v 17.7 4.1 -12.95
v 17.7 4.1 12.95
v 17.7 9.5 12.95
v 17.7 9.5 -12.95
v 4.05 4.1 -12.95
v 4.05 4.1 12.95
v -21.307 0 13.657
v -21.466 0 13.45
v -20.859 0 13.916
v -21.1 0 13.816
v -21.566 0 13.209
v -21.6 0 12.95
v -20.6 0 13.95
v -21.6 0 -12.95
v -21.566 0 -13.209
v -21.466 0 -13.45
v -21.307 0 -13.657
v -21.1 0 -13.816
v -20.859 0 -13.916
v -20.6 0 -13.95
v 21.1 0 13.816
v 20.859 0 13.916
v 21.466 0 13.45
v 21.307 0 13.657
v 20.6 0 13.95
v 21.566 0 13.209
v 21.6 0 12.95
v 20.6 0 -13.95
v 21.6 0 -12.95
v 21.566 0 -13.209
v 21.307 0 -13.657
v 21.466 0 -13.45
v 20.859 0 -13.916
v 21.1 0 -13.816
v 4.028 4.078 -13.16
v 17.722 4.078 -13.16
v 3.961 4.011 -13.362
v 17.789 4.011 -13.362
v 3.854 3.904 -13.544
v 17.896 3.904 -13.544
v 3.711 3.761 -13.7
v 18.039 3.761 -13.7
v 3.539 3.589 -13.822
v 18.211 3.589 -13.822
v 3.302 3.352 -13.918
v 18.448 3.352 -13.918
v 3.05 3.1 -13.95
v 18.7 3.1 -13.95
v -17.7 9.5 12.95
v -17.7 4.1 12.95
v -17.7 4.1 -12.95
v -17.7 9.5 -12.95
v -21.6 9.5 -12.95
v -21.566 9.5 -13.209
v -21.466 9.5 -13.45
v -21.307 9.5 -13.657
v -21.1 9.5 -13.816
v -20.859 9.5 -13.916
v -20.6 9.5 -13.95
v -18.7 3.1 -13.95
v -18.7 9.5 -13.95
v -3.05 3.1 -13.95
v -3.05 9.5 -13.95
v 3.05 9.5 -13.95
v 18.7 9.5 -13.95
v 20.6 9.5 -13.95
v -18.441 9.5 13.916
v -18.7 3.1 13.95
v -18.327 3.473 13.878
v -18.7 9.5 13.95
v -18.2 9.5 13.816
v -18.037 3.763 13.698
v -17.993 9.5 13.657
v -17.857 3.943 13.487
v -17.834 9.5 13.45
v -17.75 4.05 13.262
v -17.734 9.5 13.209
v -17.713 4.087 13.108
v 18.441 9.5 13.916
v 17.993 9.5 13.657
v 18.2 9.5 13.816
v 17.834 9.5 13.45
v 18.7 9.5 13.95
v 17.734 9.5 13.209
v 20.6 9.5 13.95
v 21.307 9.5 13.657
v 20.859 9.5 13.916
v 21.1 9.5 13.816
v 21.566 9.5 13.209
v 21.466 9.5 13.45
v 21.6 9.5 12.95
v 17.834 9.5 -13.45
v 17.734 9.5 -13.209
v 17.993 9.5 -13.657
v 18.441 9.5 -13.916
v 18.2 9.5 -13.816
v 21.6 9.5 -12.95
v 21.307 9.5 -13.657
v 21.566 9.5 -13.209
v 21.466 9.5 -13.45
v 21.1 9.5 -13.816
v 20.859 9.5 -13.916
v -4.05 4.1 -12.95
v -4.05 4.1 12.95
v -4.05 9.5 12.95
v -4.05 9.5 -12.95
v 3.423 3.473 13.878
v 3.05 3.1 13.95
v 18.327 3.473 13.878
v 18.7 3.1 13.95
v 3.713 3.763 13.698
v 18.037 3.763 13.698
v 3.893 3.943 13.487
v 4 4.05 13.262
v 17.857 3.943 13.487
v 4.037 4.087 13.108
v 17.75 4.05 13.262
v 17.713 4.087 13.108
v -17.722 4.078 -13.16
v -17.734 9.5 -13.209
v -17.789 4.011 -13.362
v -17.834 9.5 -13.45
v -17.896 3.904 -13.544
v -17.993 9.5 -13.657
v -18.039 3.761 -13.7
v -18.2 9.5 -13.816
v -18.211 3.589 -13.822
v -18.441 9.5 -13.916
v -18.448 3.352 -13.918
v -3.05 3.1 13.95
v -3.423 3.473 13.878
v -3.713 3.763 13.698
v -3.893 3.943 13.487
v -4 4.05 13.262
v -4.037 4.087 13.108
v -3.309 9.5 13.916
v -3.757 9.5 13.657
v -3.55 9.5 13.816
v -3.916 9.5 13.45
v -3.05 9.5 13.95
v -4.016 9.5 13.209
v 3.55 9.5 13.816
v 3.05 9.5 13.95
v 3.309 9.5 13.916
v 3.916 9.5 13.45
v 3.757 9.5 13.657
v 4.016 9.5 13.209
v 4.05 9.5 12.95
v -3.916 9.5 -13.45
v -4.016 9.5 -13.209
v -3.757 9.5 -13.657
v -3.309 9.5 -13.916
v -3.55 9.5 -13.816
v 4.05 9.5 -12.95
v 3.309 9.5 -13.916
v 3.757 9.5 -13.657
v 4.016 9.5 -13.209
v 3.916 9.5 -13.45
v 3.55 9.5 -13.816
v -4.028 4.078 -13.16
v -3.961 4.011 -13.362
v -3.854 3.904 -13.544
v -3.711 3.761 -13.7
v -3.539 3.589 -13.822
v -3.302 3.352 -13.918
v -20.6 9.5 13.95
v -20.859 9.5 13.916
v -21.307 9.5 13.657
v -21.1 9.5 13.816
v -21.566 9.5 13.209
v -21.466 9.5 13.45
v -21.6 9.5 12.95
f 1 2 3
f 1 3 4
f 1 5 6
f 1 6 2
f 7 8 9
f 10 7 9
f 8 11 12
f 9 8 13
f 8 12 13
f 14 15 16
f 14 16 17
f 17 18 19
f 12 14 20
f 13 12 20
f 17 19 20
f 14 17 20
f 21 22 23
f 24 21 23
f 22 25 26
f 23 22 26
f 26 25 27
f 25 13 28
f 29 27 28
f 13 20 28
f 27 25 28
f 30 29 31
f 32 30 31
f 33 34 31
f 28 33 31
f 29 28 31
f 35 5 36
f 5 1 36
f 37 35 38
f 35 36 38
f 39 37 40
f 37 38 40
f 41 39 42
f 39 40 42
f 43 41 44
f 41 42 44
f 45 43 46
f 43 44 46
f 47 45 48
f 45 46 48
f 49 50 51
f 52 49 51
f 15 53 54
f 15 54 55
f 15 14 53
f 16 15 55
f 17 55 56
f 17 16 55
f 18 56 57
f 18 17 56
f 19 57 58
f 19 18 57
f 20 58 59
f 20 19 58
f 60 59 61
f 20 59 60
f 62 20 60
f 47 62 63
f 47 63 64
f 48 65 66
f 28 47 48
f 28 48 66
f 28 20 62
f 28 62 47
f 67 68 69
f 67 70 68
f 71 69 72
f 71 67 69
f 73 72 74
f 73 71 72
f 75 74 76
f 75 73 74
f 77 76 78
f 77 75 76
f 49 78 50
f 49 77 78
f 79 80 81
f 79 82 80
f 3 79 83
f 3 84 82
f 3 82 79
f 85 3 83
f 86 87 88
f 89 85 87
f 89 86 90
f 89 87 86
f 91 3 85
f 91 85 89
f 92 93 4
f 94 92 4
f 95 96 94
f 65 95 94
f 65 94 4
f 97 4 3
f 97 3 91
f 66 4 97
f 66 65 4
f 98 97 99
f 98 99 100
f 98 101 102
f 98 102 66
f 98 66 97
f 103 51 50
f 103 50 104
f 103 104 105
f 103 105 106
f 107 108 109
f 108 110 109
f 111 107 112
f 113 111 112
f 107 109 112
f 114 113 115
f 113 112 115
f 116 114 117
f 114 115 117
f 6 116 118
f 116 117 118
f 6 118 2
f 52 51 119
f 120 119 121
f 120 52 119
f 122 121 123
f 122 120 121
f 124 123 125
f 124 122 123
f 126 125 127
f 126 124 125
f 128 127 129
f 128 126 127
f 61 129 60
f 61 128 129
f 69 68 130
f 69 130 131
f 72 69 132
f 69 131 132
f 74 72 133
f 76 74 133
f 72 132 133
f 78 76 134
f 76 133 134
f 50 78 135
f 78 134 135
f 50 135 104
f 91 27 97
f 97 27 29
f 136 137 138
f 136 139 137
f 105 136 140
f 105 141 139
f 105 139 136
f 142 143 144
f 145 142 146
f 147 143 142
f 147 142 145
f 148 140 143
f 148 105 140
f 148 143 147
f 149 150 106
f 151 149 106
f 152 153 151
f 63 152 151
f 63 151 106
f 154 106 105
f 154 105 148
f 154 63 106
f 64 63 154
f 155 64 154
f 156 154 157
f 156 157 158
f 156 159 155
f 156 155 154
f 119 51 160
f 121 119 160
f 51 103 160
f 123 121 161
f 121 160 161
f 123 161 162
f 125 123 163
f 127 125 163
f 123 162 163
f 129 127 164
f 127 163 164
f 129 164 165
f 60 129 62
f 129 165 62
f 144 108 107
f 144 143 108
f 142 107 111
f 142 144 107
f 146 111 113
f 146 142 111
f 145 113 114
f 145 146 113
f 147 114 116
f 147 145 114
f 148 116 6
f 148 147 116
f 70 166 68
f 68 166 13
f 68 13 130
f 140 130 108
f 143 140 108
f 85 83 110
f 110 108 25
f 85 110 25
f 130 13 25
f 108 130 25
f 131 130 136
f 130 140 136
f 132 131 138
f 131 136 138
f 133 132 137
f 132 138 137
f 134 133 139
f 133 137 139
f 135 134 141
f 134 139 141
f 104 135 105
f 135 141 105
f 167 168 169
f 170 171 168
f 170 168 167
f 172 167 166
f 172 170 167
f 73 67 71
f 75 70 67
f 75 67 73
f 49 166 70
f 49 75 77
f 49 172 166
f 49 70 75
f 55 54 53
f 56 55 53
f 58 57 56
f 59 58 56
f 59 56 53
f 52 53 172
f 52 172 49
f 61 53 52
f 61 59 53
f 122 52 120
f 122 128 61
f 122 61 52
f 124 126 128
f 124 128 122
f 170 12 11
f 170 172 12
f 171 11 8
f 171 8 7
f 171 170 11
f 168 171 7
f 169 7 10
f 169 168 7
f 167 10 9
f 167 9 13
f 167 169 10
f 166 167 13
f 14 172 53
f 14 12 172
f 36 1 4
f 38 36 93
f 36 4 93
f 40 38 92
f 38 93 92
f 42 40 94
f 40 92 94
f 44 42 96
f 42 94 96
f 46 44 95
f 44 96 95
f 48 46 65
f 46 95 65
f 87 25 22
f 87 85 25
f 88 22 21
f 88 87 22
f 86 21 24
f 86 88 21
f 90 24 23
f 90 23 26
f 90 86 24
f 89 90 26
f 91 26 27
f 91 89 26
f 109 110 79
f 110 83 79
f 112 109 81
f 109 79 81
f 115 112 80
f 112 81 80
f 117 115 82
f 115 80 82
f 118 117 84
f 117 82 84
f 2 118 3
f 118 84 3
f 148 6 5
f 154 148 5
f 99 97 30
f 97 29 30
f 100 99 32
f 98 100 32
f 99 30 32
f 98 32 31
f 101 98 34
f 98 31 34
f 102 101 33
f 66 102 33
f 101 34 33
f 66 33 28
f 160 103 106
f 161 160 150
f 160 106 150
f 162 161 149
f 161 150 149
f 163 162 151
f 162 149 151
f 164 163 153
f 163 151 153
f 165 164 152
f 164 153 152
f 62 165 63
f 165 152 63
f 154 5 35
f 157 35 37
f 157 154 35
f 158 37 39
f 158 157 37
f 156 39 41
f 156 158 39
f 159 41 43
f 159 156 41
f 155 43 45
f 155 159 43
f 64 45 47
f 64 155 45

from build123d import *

# Parameters (mm, degrees)
SKETCH_1_W      = 43.2
SKETCH_1_H      = 27.9
EXTRUDE_1_DEPTH = 4.1
SKETCH_2_W      = 8.1
SKETCH_2_H      = 27.9
SKETCH_2_W_2    = 3.9
EXTRUDE_2_DEPTH = 5.4
FILLET_1_R      = 1


with BuildPart() as part:
    # Эскиз1 → Бобышка-Вытянуть1 (new body)
    with BuildSketch(Plane(origin=(0, 0, 0), x_dir=(1, 0, 0), z_dir=(0, 1, 0))):
        Rectangle(SKETCH_1_W, SKETCH_1_H)
    extrude(amount=EXTRUDE_1_DEPTH)

    # Эскиз2 → Бобышка-Вытянуть2 (add)
    with BuildSketch(Plane(origin=(0, 4.1, 0), x_dir=(1, 0, 0), z_dir=(0, 1, 0))):
        Rectangle(SKETCH_2_W, SKETCH_2_H)
        with Locations((-19.65, 0)):
            Rectangle(SKETCH_2_W_2, SKETCH_2_H)
        with Locations((19.65, 0)):
            Rectangle(SKETCH_2_W_2, SKETCH_2_H)
    extrude(amount=EXTRUDE_2_DEPTH)

    # Скругление1
    fillet_1_edges = [part.edges().sort_by_distance(p)[0] for p in [
        (-10.875, 4.1, -13.95),
        (10.875, 4.1, 13.95),
        (4.05, 6.8, 13.95),
        (4.05, 6.8, -13.95),
        (-4.05, 6.8, -13.95),
        (-4.05, 6.8, 13.95),
        (-10.875, 4.1, 13.95),
        (-17.7, 6.8, 13.95),
        (-17.7, 6.8, -13.95),
        (10.875, 4.1, -13.95),
        (17.7, 6.8, -13.95),
        (17.7, 6.8, 13.95),
        (21.6, 4.75, 13.95),
        (-21.6, 4.75, 13.95),
        (-21.6, 4.75, -13.95),
        (21.6, 4.75, -13.95),
    ]]
    fillet(fillet_1_edges, radius=FILLET_1_R)


solid = part.part
